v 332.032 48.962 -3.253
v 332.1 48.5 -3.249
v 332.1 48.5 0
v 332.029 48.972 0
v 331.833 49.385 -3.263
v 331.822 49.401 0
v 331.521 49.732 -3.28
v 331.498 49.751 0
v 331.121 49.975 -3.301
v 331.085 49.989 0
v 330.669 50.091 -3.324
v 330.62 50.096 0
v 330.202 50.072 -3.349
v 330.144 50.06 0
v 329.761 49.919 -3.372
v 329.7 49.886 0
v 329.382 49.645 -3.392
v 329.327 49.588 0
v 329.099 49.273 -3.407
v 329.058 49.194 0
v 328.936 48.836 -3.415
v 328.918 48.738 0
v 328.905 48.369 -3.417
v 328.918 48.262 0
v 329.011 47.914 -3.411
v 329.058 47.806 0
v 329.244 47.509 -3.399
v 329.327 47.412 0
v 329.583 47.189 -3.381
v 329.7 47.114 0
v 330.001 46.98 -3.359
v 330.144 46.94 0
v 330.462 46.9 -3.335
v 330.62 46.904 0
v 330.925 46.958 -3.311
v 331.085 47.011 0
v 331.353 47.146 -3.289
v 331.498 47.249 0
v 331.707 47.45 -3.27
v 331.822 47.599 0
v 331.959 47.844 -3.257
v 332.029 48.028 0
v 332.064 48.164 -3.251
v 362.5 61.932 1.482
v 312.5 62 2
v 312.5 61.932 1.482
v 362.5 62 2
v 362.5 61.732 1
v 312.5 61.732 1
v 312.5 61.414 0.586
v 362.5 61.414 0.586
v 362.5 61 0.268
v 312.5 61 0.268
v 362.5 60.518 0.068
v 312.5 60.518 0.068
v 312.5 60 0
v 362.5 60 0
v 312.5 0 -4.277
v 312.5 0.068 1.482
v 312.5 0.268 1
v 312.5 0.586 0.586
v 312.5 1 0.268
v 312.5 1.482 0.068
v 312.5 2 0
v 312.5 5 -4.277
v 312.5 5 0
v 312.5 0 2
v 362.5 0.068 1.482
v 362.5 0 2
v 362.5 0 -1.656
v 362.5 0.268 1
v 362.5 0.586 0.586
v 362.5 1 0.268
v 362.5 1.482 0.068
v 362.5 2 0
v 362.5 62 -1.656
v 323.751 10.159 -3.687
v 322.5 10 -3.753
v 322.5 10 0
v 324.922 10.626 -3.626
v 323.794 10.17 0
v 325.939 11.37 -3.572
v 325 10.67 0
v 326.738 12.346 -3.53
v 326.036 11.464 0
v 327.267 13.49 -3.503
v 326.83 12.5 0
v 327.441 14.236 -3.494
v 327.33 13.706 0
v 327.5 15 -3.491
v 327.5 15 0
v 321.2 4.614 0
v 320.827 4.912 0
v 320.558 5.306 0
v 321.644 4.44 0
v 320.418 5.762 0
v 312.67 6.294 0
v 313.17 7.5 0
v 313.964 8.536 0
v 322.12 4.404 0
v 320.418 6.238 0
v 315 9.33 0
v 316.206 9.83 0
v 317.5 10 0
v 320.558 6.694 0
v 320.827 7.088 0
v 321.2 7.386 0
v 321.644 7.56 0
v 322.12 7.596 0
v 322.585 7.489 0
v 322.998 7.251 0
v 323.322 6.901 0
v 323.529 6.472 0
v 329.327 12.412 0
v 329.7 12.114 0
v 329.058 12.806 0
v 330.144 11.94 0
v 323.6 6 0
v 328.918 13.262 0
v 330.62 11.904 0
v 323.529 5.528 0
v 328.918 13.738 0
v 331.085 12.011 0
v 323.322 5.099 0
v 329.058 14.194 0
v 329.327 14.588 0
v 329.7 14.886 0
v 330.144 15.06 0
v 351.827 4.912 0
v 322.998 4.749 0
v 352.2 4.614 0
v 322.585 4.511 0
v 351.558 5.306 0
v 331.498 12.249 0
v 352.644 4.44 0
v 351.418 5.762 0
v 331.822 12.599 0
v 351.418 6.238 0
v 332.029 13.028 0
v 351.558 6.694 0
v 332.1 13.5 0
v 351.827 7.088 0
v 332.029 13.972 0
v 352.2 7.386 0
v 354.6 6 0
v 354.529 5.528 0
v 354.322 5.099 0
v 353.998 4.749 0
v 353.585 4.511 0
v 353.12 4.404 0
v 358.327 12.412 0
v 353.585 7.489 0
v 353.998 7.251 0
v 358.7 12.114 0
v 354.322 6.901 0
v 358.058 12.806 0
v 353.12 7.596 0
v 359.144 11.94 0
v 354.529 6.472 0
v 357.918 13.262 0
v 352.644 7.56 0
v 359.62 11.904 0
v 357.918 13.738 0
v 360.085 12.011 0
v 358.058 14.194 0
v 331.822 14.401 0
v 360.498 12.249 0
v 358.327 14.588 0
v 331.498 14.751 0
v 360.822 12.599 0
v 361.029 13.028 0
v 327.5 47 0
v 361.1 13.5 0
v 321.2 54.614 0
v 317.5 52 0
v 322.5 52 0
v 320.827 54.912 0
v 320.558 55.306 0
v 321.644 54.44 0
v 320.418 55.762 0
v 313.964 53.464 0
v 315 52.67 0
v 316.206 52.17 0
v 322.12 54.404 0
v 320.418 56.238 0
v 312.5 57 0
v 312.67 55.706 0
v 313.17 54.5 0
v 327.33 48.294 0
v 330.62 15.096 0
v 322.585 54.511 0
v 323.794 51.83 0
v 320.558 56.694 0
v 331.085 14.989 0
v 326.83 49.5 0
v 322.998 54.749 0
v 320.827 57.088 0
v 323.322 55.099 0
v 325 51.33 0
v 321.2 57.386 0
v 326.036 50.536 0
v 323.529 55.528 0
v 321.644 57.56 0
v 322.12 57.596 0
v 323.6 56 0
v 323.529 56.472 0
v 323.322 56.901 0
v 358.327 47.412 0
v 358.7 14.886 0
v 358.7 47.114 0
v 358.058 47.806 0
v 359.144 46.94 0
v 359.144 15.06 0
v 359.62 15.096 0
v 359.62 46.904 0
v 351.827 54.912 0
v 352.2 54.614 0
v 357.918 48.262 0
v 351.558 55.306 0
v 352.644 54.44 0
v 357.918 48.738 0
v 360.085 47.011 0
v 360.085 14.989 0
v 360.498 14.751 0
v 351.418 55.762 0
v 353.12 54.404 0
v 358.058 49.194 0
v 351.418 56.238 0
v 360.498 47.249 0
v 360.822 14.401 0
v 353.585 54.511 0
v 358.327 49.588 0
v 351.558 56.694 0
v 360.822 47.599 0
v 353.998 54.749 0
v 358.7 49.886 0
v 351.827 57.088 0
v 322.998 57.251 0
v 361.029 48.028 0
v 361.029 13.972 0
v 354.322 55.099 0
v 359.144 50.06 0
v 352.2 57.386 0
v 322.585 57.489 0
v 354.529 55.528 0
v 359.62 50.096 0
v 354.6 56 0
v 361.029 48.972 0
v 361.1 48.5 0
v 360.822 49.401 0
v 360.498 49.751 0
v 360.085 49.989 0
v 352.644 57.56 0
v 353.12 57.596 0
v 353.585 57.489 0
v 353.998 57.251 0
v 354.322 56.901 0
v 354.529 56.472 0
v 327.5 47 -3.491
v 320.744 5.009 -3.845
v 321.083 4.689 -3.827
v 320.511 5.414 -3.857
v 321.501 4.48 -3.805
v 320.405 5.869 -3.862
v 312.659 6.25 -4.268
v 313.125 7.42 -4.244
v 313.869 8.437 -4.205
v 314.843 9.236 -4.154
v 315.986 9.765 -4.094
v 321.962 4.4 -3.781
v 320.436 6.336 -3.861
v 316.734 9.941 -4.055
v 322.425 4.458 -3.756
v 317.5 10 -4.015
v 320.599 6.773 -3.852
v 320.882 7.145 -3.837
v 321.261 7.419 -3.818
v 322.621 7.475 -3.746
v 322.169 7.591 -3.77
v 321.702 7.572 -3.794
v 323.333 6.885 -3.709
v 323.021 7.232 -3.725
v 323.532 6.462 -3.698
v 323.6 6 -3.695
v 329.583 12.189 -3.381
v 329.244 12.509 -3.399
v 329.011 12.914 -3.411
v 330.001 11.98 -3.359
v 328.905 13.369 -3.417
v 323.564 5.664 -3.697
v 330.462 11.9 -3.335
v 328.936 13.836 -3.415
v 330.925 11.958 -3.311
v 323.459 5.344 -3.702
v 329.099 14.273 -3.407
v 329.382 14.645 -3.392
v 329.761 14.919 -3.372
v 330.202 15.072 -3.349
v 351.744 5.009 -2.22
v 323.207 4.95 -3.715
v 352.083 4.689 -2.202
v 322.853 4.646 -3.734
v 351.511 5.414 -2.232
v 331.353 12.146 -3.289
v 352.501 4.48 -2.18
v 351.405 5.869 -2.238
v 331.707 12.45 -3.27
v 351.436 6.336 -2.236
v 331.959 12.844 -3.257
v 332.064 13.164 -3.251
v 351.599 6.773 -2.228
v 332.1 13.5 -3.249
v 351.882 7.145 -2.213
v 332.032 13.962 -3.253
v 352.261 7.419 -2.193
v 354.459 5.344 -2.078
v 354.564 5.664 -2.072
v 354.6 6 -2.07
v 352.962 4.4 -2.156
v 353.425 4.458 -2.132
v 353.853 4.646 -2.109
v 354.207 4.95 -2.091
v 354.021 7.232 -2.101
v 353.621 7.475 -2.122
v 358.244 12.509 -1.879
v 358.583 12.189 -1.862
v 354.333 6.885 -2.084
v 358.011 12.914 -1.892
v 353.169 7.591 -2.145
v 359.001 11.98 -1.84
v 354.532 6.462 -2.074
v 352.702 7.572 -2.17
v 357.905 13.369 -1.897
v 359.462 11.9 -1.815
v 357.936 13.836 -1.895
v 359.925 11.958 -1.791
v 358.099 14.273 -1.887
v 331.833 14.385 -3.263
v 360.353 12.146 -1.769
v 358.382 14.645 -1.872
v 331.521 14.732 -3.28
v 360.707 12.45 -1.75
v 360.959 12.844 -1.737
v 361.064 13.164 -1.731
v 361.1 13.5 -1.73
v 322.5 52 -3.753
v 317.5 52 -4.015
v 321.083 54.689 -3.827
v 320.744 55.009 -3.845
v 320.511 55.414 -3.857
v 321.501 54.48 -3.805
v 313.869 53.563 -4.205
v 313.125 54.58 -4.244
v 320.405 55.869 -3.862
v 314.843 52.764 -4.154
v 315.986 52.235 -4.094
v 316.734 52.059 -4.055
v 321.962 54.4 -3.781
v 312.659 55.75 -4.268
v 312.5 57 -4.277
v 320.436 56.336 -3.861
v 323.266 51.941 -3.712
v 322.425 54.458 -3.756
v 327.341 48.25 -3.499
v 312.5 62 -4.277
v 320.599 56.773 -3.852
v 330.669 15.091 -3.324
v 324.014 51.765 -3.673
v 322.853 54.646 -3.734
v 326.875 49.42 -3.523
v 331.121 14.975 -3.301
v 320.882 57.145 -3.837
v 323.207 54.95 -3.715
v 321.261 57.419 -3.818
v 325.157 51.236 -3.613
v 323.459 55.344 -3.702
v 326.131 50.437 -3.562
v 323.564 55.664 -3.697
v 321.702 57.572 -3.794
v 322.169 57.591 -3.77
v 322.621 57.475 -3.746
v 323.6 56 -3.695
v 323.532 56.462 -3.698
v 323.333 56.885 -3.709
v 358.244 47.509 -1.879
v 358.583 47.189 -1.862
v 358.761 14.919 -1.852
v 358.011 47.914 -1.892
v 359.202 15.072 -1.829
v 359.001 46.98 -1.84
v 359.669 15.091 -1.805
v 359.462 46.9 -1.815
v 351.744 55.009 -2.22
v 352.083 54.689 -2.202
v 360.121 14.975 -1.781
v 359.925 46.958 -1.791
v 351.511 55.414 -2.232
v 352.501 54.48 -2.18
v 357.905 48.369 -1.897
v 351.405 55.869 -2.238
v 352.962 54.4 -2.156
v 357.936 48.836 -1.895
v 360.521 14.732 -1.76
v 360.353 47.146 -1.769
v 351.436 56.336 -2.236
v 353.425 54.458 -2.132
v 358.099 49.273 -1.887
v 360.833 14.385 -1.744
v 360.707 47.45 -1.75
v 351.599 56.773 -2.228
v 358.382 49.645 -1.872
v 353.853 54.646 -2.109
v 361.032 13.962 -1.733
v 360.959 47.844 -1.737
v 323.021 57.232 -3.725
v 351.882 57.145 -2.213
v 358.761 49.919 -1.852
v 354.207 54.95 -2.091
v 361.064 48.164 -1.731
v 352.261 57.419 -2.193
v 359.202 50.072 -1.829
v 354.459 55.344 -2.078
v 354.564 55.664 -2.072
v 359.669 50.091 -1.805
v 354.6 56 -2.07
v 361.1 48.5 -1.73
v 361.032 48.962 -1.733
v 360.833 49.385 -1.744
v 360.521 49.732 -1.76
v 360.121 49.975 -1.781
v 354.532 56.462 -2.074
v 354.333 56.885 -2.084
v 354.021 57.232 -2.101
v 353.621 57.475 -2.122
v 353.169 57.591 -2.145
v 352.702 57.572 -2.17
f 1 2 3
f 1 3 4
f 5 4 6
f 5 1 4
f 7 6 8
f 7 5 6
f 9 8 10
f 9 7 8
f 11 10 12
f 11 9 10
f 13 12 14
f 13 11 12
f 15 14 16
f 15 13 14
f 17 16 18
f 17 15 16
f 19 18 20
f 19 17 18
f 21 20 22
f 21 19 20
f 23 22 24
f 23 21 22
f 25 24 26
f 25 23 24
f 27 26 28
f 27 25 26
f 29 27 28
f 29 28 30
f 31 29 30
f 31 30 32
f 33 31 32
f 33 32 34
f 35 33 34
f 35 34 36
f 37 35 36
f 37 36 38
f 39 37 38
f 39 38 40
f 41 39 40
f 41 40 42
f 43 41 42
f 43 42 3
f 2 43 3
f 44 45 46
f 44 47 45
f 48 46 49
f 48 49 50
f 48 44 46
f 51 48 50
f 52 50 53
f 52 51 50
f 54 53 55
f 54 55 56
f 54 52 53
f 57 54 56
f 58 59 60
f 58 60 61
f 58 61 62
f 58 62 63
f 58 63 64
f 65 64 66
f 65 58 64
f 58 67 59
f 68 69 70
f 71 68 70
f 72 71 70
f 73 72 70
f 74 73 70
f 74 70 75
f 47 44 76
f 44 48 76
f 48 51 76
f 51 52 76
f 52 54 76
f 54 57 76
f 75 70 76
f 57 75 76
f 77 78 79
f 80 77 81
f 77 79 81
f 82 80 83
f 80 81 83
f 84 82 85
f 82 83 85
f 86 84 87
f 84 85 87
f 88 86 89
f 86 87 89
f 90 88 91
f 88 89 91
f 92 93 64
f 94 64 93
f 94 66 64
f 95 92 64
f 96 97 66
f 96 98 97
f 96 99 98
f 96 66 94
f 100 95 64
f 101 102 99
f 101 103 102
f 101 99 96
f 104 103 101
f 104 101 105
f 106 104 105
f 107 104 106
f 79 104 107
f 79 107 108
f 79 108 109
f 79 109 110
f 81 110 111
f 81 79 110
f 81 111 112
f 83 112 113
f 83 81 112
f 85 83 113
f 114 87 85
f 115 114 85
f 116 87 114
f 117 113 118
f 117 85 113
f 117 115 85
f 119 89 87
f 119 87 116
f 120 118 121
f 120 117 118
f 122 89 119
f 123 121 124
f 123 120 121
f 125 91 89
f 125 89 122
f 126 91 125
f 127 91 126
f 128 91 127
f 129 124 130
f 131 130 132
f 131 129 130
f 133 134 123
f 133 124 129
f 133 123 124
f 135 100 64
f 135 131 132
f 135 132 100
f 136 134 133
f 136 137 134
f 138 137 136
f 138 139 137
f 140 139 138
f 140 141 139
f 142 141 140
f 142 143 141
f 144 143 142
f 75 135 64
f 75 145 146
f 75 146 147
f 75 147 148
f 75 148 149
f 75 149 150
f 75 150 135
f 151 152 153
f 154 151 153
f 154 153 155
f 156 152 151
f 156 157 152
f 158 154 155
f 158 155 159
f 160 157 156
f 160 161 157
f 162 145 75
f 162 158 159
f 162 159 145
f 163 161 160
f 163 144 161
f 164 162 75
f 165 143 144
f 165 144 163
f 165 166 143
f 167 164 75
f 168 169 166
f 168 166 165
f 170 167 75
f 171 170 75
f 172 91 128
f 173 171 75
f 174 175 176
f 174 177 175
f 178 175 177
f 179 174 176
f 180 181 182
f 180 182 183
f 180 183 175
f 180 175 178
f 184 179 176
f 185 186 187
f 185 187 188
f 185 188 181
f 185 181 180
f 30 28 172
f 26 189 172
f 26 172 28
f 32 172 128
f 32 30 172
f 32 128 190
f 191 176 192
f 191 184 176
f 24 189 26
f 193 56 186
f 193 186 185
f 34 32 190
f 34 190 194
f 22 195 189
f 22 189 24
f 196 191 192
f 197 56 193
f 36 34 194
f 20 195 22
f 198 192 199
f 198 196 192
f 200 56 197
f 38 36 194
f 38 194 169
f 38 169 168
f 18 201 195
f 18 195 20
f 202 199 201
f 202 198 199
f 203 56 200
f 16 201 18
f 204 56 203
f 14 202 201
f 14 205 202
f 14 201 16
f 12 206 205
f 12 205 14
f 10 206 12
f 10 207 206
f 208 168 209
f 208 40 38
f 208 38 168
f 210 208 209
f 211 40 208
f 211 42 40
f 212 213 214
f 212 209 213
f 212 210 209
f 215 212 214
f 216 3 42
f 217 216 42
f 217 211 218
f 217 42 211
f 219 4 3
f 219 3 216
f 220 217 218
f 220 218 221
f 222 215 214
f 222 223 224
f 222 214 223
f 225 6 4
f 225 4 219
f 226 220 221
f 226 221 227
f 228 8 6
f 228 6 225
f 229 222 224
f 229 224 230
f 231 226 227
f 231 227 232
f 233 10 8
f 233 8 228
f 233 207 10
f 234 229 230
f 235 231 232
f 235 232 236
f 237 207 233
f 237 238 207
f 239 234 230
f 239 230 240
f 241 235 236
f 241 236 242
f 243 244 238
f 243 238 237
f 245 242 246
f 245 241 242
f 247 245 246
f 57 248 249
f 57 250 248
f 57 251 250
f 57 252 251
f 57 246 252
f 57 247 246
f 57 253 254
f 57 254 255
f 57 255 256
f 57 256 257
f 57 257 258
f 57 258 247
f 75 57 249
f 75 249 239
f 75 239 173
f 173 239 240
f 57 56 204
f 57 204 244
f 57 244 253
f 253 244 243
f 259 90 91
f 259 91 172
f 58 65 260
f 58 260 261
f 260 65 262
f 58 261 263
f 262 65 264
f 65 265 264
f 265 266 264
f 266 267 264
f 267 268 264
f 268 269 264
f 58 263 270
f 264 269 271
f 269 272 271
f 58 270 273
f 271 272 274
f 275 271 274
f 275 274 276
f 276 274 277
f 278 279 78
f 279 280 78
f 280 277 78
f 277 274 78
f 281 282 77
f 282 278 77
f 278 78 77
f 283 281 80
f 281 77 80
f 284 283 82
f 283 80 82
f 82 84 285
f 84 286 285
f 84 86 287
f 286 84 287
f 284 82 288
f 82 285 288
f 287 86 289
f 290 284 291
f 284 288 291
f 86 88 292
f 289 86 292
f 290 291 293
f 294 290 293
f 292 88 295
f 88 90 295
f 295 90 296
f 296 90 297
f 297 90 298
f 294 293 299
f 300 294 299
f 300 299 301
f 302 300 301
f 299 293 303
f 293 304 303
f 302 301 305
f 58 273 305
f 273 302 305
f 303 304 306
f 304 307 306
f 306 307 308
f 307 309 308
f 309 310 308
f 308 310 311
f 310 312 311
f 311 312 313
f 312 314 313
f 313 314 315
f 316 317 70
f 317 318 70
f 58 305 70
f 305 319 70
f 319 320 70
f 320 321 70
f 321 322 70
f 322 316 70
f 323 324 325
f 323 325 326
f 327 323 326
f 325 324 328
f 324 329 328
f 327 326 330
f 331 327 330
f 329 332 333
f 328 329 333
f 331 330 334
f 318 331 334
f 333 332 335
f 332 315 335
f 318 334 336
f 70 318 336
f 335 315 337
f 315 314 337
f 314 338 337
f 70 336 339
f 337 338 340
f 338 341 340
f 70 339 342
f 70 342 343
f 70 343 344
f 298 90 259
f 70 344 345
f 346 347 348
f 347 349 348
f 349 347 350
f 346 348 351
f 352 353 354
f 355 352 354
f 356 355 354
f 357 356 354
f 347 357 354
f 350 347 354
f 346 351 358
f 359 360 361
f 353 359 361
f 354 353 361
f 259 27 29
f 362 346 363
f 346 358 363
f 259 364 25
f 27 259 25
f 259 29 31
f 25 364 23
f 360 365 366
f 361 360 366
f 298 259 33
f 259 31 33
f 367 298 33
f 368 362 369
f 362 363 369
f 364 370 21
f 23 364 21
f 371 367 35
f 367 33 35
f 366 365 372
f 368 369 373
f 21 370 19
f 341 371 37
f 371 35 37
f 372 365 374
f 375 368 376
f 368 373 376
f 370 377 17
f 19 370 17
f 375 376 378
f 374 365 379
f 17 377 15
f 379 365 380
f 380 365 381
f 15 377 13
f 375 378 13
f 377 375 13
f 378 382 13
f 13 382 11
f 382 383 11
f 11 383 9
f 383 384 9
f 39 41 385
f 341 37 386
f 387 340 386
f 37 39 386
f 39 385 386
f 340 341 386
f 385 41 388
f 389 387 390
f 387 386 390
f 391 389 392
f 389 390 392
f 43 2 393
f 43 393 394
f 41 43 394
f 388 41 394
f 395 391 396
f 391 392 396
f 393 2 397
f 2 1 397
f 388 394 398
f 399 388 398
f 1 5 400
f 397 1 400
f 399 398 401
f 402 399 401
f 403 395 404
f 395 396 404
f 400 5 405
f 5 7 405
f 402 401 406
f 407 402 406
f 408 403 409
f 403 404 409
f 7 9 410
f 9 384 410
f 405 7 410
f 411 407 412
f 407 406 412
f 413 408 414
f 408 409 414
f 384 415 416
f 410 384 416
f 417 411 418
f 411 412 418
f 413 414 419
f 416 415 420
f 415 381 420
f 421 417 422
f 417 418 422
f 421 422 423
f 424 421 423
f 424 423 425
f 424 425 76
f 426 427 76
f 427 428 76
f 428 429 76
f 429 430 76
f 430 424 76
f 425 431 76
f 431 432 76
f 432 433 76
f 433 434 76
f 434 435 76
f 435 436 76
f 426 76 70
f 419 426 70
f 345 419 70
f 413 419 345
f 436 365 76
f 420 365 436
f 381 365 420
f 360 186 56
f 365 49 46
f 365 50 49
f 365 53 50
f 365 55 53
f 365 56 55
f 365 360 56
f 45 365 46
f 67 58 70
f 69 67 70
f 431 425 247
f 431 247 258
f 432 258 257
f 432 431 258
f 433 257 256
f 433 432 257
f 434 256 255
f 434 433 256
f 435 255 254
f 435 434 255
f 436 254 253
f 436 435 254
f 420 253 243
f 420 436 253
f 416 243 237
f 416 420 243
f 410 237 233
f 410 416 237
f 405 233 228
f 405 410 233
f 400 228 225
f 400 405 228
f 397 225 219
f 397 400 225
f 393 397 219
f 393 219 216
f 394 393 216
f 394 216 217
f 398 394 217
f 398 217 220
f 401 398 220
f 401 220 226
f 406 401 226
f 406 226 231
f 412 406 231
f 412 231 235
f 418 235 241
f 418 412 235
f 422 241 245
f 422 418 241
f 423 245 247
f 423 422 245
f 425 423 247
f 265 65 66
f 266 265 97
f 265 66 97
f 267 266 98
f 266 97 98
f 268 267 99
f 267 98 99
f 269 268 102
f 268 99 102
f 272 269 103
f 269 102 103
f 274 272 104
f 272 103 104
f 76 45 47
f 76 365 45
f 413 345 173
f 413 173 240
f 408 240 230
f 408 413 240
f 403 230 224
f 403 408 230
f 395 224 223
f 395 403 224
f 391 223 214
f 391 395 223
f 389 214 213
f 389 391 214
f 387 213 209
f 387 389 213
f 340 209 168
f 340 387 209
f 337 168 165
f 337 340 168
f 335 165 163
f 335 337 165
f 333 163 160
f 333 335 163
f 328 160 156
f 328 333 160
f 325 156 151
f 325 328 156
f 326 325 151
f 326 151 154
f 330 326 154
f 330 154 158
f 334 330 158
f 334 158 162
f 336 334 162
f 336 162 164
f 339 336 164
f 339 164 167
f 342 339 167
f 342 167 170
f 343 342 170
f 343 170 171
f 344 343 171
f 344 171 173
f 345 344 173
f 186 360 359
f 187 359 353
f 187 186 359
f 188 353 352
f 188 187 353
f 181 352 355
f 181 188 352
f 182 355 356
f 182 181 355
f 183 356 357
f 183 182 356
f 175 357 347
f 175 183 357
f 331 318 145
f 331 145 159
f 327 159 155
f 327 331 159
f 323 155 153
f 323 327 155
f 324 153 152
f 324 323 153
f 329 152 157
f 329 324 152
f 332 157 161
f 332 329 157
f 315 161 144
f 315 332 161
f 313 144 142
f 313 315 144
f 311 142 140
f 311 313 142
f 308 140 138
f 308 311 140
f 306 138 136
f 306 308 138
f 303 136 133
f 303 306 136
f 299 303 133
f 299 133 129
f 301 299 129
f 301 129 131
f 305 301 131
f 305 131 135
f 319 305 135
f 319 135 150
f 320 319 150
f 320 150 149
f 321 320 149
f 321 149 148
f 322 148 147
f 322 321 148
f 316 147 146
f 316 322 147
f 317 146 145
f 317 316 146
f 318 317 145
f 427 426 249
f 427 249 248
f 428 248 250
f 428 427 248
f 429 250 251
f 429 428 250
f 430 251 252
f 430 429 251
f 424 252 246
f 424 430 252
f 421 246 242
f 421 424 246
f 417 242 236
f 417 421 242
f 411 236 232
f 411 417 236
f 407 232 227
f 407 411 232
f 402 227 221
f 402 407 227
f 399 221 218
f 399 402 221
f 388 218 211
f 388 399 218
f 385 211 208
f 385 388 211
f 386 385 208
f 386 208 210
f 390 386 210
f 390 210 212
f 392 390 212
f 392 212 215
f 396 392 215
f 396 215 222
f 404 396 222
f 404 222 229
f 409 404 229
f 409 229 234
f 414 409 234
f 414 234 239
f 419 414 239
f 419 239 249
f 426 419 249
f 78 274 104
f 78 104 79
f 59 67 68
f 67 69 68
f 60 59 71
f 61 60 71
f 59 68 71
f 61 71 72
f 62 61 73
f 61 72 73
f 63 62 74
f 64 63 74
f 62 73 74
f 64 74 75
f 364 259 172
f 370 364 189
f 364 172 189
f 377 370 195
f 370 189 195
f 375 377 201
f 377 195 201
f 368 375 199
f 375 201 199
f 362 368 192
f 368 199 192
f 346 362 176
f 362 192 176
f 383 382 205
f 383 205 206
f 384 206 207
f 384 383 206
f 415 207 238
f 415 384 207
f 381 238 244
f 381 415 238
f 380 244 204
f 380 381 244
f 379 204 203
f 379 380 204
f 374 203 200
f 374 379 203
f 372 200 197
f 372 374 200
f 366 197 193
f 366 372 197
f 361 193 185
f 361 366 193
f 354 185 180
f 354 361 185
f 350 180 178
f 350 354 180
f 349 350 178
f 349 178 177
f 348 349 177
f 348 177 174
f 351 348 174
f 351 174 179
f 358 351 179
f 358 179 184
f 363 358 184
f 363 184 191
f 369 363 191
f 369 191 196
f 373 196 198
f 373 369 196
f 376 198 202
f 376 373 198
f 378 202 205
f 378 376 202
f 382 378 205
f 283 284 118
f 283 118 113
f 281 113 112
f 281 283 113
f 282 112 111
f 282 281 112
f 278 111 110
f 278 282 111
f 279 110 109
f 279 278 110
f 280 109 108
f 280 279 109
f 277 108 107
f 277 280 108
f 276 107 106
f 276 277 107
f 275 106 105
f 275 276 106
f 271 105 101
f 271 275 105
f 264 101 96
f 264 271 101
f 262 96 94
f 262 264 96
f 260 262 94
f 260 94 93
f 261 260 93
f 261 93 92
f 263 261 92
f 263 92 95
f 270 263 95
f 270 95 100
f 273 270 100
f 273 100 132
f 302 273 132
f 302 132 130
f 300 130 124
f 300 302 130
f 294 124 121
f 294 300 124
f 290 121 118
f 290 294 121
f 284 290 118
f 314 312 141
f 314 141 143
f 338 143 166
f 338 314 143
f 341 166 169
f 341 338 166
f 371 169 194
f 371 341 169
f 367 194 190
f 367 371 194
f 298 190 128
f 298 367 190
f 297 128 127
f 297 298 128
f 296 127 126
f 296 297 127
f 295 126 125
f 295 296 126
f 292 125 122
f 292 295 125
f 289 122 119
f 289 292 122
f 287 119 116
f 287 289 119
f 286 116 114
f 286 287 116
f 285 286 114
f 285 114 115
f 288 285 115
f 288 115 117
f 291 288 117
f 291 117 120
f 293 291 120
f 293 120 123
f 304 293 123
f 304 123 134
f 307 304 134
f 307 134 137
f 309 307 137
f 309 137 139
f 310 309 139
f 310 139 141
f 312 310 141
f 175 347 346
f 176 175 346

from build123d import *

# Parameters (mm, degrees)
CYLINDER138_R          = 1.6
CYLINDER138_DEPTH      = 10
CYLINDER139_R          = 1.6
CYLINDER139_DEPTH      = 10
CYLINDER140_R          = 1.6
CYLINDER140_DEPTH      = 10
CYLINDER141_R          = 1.6
CYLINDER141_DEPTH      = 10
BOX063_W               = 62
BOX063_H               = 10
BOX063_DEPTH           = 29
BOX064_W               = 62
BOX064_H               = 10
BOX064_DEPTH           = 29
CYLINDER103_R          = 1.6
CYLINDER103_DEPTH      = 10
CYLINDER102_R          = 1.6
CYLINDER102_DEPTH      = 10
CYLINDER104_R          = 1.6
CYLINDER104_DEPTH      = 10
CYLINDER105_R          = 1.6
CYLINDER105_DEPTH      = 10
CYLINDER099_R          = 1.6
CYLINDER099_DEPTH      = 15
CYLINDER098_R          = 1.6
CYLINDER098_DEPTH      = 15
CYLINDER101_R          = 1.6
CYLINDER101_DEPTH      = 15
CYLINDER100_R          = 1.6
CYLINDER100_DEPTH      = 15
BOX047_W               = 15
BOX047_H               = 42
BOX047_DEPTH           = 20
BOX046_W               = 50
BOX046_H               = 62
BOX046_DEPTH           = 20
FILLET018_R            = 2
BOX044_W               = 58
BOX044_H               = 68
BOX044_DEPTH           = 10
BOX044_PLACEMENT_ANGLE = 3
BOX045_W               = 50
BOX045_H               = 68
BOX045_DEPTH           = 22
FILLET019_R            = 5
FILLET020_R            = 2
FILLET021_R            = 5
FILLET022_R            = 3


with BuildPart() as cylinder138:
    # Cylinder138 → Cylinder138 (new body)
    with BuildSketch(Plane(origin=(320, 6, -6), x_dir=(1, 0, 0), z_dir=(0, 0, 1))):
        Circle(CYLINDER138_R)
    extrude(amount=CYLINDER138_DEPTH)


with BuildPart() as fusion116:
    # Cylinder139 → Cylinder139 (new body)
    with BuildSketch(Plane(origin=(320, 56, -6), x_dir=(1, 0, 0), z_dir=(0, 0, 1))):
        Circle(CYLINDER139_R)
    extrude(amount=CYLINDER139_DEPTH)

    # Fusion116: union Cylinder138
    add(cylinder138.part)


with BuildPart() as fusion116_1:
    # Fusion116 placement: moved
    add(fusion116.part.moved(Location((2, 0, 0))))


with BuildPart() as cylinder140:
    # Cylinder140 → Cylinder140 (new body)
    with BuildSketch(Plane(origin=(320, 6, -6), x_dir=(1, 0, 0), z_dir=(0, 0, 1))):
        Circle(CYLINDER140_R)
    extrude(amount=CYLINDER140_DEPTH)


with BuildPart() as fusion118:
    # Cylinder141 → Cylinder141 (new body)
    with BuildSketch(Plane(origin=(320, 56, -6), x_dir=(1, 0, 0), z_dir=(0, 0, 1))):
        Circle(CYLINDER141_R)
    extrude(amount=CYLINDER141_DEPTH)

    # Fusion117: union Cylinder140
    add(cylinder140.part)


with BuildPart() as fusion118_1:
    # Fusion117 placement: moved
    add(fusion118.part.moved(Location((33, 0, 0))))

    # Fusion118: union Fusion116
    add(fusion116_1.part)


with BuildPart() as cube042:
    # Box063 → Box063 (new body)
    with BuildSketch(Plane(origin=(309, -10, -9), x_dir=(1, 0, 0), z_dir=(0, 0, 1))):
        with Locations((31, 5)):
            Rectangle(BOX063_W, BOX063_H)
    extrude(amount=BOX063_DEPTH)


with BuildPart() as fusion115:
    # Box064 → Box064 (new body)
    with BuildSketch(Plane(origin=(309, 62, -9), x_dir=(1, 0, 0), z_dir=(0, 0, 1))):
        with Locations((31, 5)):
            Rectangle(BOX064_W, BOX064_H)
    extrude(amount=BOX064_DEPTH)

    # Fusion115: union Cube042
    add(cube042.part)


with BuildPart() as cylinder103:
    # Cylinder103 → Cylinder103 (new body)
    with BuildSketch(Plane(origin=(355, 7, 10), x_dir=(1, 0, 0), z_dir=(0, -1, 0))):
        Circle(CYLINDER103_R)
    extrude(amount=CYLINDER103_DEPTH)


with BuildPart() as fusion089:
    # Cylinder102 → Cylinder102 (new body)
    with BuildSketch(Plane(origin=(320, 7, 10), x_dir=(1, 0, 0), z_dir=(0, -1, 0))):
        Circle(CYLINDER102_R)
    extrude(amount=CYLINDER102_DEPTH)

    # Fusion089: union Cylinder103
    add(cylinder103.part)


with BuildPart() as cylinder104:
    # Cylinder104 → Cylinder104 (new body)
    with BuildSketch(Plane(origin=(355, 7, 10), x_dir=(1, 0, 0), z_dir=(0, -1, 0))):
        Circle(CYLINDER104_R)
    extrude(amount=CYLINDER104_DEPTH)


with BuildPart() as fusion091:
    # Cylinder105 → Cylinder105 (new body)
    with BuildSketch(Plane(origin=(320, 7, 10), x_dir=(1, 0, 0), z_dir=(0, -1, 0))):
        Circle(CYLINDER105_R)
    extrude(amount=CYLINDER105_DEPTH)

    # Fusion090: union Cylinder104
    add(cylinder104.part)


with BuildPart() as fusion091_1:
    # Fusion090 placement: moved
    add(fusion091.part.moved(Location((0, 58, 0))))

    # Fusion091: union Fusion089
    add(fusion089.part)


with BuildPart() as cylinder099:
    # Cylinder099 → Cylinder099 (new body)
    with BuildSketch(Plane(origin=(359.5, 13.5, -15), x_dir=(1, 0, 0), z_dir=(0, 0, 1))):
        Circle(CYLINDER099_R)
    extrude(amount=CYLINDER099_DEPTH)


with BuildPart() as fusion083:
    # Cylinder098 → Cylinder098 (new body)
    with BuildSketch(Plane(origin=(330.5, 13.5, -15), x_dir=(1, 0, 0), z_dir=(0, 0, 1))):
        Circle(CYLINDER098_R)
    extrude(amount=CYLINDER098_DEPTH)

    # Fusion083: union Cylinder099
    add(cylinder099.part)


with BuildPart() as cylinder101:
    # Cylinder101 → Cylinder101 (new body)
    with BuildSketch(Plane(origin=(359.5, 13.5, -15), x_dir=(1, 0, 0), z_dir=(0, 0, 1))):
        Circle(CYLINDER101_R)
    extrude(amount=CYLINDER101_DEPTH)


with BuildPart() as fusion085:
    # Cylinder100 → Cylinder100 (new body)
    with BuildSketch(Plane(origin=(330.5, 13.5, -15), x_dir=(1, 0, 0), z_dir=(0, 0, 1))):
        Circle(CYLINDER100_R)
    extrude(amount=CYLINDER100_DEPTH)

    # Fusion084: union Cylinder101
    add(cylinder101.part)


with BuildPart() as fusion085_1:
    # Fusion084 placement: moved
    add(fusion085.part.moved(Location((0, 35, 0))))

    # Fusion085: union Fusion083
    add(fusion083.part)


with BuildPart() as cube026:
    # Box047 → Box047 (new body)
    with BuildSketch(Plane(origin=(312.5, 10, -5), x_dir=(1, 0, 0), z_dir=(0, 0, 1))):
        with Locations((7.5, 21)):
            Rectangle(BOX047_W, BOX047_H)
    extrude(amount=BOX047_DEPTH)


with BuildPart() as fillet018:
    # Box046 → Box046 (new body)
    with BuildSketch(Plane(origin=(312.5, 0, 0), x_dir=(1, 0, 0), z_dir=(0, 0, 1))):
        with Locations((25, 31)):
            Rectangle(BOX046_W, BOX046_H)
    extrude(amount=BOX046_DEPTH)

    # Fillet018
    fillet018_edges = [fillet018.edges().sort_by_distance(p)[0] for p in [
        (337.5, 0, 0),
        (337.5, 62, 0),
    ]]
    fillet(fillet018_edges, radius=FILLET018_R)


with BuildPart() as cube023:
    # Box044 → Box044 (new body)
    with BuildSketch(Plane.XY):
        with Locations((29, 34)):
            Rectangle(BOX044_W, BOX044_H)
    extrude(amount=BOX044_DEPTH)


with BuildPart() as cube023_1:
    # Box044 placement: moved
    add(cube023.part.moved(Location((308.5, -3, -14.5))).rotate(Axis((308.5, -3, -14.5), (0, -1, 0)), BOX044_PLACEMENT_ANGLE))


with BuildPart() as battery_box_holder:
    # Box045 → Box045 (new body)
    with BuildSketch(Plane(origin=(312.5, -3, -5), x_dir=(1, 0, 0), z_dir=(0, 0, 1))):
        with Locations((25, 34)):
            Rectangle(BOX045_W, BOX045_H)
    extrude(amount=BOX045_DEPTH)

    # Cut051: cut Cube023
    add(cube023_1.part, mode=Mode.SUBTRACT)

    # Cut052: cut Fillet018
    add(fillet018.part, mode=Mode.SUBTRACT)

    # Cut053: cut Cube026
    add(cube026.part, mode=Mode.SUBTRACT)

    # Fillet019
    fillet019_edges = [battery_box_holder.edges().sort_by_distance(p)[0] for p in [
        (327.5, 10, -1.745264),
        (327.5, 52, -1.745264),
    ]]
    fillet(fillet019_edges, radius=FILLET019_R)

    # Fillet020
    fillet020_edges = [battery_box_holder.edges().sort_by_distance(p)[0] for p in [
        (337.5, -3, -2.966451),
        (337.5, 65, -2.966451),
    ]]
    fillet(fillet020_edges, radius=FILLET020_R)

    # Fillet021
    fillet021_edges = [battery_box_holder.edges().sort_by_distance(p)[0] for p in [
        (312.5, 10, -2.138323),
        (312.5, 52, -2.138323),
    ]]
    fillet(fillet021_edges, radius=FILLET021_R)

    # Cut054: cut Fusion085
    add(fusion085_1.part, mode=Mode.SUBTRACT)

    # Cut055: cut Fusion091
    add(fusion091_1.part, mode=Mode.SUBTRACT)

    # Fillet022
    fillet022_edges = [battery_box_holder.edges().sort_by_distance(p)[0] for p in [
        (312.5, -1.5, 17),
        (362.5, -1.5, 17),
        (362.5, 63.5, 17),
        (312.5, 63.5, 17),
    ]]
    fillet(fillet022_edges, radius=FILLET022_R)

    # Cut073: cut Fusion115
    add(fusion115.part, mode=Mode.SUBTRACT)

    # Cut074: cut Fusion118
    add(fusion118_1.part, mode=Mode.SUBTRACT)


solid = battery_box_holder.part
